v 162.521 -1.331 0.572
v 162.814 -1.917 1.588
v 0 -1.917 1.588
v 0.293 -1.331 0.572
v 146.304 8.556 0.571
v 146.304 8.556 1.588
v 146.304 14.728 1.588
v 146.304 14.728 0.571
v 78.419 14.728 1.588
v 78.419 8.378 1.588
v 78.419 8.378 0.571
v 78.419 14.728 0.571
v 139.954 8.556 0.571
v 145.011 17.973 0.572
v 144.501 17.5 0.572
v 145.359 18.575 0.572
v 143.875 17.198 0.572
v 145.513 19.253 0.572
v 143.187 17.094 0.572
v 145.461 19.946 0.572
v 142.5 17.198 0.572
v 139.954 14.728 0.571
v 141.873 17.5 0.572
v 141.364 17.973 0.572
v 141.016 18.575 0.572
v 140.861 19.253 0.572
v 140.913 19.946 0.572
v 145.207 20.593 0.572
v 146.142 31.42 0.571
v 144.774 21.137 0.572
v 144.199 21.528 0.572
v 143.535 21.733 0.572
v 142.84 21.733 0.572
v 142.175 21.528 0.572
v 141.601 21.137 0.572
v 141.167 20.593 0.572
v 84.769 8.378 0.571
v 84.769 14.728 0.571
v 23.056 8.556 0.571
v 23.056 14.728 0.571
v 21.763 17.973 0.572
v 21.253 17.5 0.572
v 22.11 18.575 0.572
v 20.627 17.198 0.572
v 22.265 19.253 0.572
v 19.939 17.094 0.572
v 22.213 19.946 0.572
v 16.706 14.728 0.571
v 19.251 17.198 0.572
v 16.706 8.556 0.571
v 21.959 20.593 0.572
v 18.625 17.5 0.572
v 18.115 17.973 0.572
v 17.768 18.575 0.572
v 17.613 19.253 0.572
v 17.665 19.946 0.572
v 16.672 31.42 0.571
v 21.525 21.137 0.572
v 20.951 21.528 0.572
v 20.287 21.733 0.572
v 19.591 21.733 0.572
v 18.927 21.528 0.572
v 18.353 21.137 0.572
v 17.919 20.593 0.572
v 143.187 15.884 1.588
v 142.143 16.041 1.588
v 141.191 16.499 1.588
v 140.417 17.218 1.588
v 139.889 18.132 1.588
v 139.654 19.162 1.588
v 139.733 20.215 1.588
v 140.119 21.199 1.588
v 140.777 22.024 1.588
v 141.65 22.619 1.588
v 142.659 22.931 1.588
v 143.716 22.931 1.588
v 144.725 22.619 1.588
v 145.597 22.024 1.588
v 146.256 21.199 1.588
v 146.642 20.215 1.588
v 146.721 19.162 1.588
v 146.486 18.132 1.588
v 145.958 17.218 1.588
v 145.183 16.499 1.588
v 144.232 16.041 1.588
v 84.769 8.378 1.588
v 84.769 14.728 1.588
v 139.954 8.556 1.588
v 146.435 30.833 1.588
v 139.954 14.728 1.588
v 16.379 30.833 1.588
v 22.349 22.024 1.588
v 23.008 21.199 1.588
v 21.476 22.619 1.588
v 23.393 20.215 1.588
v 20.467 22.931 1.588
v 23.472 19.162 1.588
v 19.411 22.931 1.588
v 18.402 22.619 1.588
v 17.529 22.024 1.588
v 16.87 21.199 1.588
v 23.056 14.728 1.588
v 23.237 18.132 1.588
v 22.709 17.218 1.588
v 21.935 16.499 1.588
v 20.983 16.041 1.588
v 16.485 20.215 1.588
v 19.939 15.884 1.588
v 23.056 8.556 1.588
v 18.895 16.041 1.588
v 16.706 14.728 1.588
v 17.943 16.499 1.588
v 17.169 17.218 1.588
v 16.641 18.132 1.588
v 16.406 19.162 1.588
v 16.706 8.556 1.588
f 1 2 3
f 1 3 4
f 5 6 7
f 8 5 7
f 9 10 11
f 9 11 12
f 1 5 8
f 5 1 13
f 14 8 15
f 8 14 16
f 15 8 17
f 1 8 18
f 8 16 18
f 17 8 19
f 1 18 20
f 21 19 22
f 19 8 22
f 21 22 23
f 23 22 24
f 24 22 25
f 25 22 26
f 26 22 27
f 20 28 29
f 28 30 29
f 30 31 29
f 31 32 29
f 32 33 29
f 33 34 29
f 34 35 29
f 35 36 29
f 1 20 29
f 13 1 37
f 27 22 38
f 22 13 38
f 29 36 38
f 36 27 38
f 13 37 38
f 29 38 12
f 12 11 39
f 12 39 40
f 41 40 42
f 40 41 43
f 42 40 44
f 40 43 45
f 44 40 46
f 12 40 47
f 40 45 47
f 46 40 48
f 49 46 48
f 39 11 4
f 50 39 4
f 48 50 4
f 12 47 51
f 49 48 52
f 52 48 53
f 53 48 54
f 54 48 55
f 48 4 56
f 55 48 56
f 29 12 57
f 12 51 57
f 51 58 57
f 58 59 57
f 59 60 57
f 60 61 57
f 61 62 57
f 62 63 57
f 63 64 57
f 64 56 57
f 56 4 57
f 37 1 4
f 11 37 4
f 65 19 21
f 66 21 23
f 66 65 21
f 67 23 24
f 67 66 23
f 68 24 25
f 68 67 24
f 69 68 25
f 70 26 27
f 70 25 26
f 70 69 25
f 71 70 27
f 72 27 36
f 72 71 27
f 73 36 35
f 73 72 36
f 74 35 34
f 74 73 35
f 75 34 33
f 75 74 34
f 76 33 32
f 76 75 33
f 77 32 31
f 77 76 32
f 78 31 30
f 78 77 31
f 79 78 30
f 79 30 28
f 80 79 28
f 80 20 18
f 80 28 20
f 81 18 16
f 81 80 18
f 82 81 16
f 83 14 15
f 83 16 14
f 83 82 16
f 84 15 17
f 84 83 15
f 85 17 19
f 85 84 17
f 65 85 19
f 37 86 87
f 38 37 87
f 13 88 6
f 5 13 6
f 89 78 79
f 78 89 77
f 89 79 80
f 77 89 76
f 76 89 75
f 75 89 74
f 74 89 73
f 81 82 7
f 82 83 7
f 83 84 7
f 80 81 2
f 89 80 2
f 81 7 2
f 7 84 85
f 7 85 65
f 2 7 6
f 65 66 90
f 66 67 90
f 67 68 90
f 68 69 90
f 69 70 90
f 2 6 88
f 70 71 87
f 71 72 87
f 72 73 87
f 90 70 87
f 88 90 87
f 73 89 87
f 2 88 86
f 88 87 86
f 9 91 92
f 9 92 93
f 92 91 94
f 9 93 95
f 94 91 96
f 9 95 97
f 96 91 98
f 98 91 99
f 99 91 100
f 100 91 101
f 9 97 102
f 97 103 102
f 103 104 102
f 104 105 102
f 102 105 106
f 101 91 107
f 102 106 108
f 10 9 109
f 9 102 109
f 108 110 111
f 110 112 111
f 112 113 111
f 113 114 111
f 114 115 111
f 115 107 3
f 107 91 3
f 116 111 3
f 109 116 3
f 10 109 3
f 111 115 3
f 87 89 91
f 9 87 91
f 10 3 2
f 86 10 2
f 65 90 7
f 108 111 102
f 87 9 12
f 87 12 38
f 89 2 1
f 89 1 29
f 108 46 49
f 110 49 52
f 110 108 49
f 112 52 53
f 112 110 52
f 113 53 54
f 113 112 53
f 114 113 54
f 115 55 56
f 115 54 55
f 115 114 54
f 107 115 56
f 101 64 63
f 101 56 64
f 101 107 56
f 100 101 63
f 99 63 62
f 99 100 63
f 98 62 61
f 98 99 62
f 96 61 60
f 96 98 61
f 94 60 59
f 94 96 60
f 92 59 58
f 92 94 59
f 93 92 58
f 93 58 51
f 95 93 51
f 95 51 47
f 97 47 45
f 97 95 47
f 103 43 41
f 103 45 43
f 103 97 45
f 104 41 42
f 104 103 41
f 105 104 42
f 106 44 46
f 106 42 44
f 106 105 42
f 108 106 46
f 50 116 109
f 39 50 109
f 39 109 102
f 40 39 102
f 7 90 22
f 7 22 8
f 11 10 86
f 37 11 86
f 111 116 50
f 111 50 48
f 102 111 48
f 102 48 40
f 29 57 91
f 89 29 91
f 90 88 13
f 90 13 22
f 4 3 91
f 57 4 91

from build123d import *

# Parameters (mm, degrees)
BOSS_EXTRUDE2_DEPTH                       = 162.814
CUT_EXTRUDE1_DEPTH                        = 166.821138692
SKETCH6_W                                 = 6.35
SKETCH6_H                                 = 6.1722
SKETCH6_H_2                               = 6.35
CUT_EXTRUDE2_DEPTH                        = 166.821138692
CSK_FOR_6_FLAT_HEAD_MACHINE_SCREW_2_COUNT = 2
CSK_FOR_6_FLAT_HEAD_MACHINE_SCREW_2_PITCH = 123.248406325


with BuildPart() as part:
    # Sketch3 → Boss-Extrude2 (new body)
    with BuildSketch(Plane(origin=(0, 0, 0), x_dir=(0, 0, -1), z_dir=(1, 0, 0))):
        Polygon((-0.5715, 31.420044321), (-1.5875, 30.833456448), (-1.5875, -1.917455679), (-0.5715, -1.330867805), align=None)
    extrude(amount=BOSS_EXTRUDE2_DEPTH)

    # Sketch5 → Cut-Extrude1 (cut, through all)
    with BuildSketch(Plane.XY.offset(1.5875)):
        Polygon((0, -1.917455679), (16.672349491, 31.420044321), (0, 31.420044321), align=None)
        Polygon((162.814, -1.917455679), (146.141650509, 31.420044321), (162.814, 31.420044321), align=None)
    extrude(amount=-CUT_EXTRUDE1_DEPTH, mode=Mode.SUBTRACT)

    # Sketch6 → Cut-Extrude2 (cut, through all)
    with BuildSketch(Plane.XY.offset(1.5875)):
        with Locations((19.880593675, 11.641857216)):
            Rectangle(SKETCH6_W, SKETCH6_H)
        with Locations((143.129, 11.641857216)):
            Rectangle(SKETCH6_W, SKETCH6_H)
        with Locations((81.593696837, 11.552957216)):
            Rectangle(SKETCH6_W, SKETCH6_H_2)
    extrude(amount=-CUT_EXTRUDE2_DEPTH, mode=Mode.SUBTRACT)

    # Sketch7 → CSK for #6 Flat Head Machine Screw (100)1 (revolve, cut)
    with BuildSketch(Plane(origin=(19.939, 19.426957216, 1.5875), x_dir=(0, -1, 0), z_dir=(1, 0, 0))):
        Polygon((0, 0), (0, 1.016), (1.89865, 1.016), (1.89865, 1.380025208), (3.5433, 0), align=None)
    csk_for_6_flat_head_machine_screw_100 = revolve(axis=Axis((19.939, 19.426957216, 7.9375), (0, 0, -1)), mode=Mode.SUBTRACT)

    # CSK for _6 Flat Head Machine Screw _ 2: CSK for #6 Flat Head Machine Screw (100)1 ×2
    with Locations(*[(i * CSK_FOR_6_FLAT_HEAD_MACHINE_SCREW_2_PITCH, 0, 0) for i in range(1, CSK_FOR_6_FLAT_HEAD_MACHINE_SCREW_2_COUNT)]):
        add(csk_for_6_flat_head_machine_screw_100, mode=Mode.SUBTRACT)


solid = part.part
